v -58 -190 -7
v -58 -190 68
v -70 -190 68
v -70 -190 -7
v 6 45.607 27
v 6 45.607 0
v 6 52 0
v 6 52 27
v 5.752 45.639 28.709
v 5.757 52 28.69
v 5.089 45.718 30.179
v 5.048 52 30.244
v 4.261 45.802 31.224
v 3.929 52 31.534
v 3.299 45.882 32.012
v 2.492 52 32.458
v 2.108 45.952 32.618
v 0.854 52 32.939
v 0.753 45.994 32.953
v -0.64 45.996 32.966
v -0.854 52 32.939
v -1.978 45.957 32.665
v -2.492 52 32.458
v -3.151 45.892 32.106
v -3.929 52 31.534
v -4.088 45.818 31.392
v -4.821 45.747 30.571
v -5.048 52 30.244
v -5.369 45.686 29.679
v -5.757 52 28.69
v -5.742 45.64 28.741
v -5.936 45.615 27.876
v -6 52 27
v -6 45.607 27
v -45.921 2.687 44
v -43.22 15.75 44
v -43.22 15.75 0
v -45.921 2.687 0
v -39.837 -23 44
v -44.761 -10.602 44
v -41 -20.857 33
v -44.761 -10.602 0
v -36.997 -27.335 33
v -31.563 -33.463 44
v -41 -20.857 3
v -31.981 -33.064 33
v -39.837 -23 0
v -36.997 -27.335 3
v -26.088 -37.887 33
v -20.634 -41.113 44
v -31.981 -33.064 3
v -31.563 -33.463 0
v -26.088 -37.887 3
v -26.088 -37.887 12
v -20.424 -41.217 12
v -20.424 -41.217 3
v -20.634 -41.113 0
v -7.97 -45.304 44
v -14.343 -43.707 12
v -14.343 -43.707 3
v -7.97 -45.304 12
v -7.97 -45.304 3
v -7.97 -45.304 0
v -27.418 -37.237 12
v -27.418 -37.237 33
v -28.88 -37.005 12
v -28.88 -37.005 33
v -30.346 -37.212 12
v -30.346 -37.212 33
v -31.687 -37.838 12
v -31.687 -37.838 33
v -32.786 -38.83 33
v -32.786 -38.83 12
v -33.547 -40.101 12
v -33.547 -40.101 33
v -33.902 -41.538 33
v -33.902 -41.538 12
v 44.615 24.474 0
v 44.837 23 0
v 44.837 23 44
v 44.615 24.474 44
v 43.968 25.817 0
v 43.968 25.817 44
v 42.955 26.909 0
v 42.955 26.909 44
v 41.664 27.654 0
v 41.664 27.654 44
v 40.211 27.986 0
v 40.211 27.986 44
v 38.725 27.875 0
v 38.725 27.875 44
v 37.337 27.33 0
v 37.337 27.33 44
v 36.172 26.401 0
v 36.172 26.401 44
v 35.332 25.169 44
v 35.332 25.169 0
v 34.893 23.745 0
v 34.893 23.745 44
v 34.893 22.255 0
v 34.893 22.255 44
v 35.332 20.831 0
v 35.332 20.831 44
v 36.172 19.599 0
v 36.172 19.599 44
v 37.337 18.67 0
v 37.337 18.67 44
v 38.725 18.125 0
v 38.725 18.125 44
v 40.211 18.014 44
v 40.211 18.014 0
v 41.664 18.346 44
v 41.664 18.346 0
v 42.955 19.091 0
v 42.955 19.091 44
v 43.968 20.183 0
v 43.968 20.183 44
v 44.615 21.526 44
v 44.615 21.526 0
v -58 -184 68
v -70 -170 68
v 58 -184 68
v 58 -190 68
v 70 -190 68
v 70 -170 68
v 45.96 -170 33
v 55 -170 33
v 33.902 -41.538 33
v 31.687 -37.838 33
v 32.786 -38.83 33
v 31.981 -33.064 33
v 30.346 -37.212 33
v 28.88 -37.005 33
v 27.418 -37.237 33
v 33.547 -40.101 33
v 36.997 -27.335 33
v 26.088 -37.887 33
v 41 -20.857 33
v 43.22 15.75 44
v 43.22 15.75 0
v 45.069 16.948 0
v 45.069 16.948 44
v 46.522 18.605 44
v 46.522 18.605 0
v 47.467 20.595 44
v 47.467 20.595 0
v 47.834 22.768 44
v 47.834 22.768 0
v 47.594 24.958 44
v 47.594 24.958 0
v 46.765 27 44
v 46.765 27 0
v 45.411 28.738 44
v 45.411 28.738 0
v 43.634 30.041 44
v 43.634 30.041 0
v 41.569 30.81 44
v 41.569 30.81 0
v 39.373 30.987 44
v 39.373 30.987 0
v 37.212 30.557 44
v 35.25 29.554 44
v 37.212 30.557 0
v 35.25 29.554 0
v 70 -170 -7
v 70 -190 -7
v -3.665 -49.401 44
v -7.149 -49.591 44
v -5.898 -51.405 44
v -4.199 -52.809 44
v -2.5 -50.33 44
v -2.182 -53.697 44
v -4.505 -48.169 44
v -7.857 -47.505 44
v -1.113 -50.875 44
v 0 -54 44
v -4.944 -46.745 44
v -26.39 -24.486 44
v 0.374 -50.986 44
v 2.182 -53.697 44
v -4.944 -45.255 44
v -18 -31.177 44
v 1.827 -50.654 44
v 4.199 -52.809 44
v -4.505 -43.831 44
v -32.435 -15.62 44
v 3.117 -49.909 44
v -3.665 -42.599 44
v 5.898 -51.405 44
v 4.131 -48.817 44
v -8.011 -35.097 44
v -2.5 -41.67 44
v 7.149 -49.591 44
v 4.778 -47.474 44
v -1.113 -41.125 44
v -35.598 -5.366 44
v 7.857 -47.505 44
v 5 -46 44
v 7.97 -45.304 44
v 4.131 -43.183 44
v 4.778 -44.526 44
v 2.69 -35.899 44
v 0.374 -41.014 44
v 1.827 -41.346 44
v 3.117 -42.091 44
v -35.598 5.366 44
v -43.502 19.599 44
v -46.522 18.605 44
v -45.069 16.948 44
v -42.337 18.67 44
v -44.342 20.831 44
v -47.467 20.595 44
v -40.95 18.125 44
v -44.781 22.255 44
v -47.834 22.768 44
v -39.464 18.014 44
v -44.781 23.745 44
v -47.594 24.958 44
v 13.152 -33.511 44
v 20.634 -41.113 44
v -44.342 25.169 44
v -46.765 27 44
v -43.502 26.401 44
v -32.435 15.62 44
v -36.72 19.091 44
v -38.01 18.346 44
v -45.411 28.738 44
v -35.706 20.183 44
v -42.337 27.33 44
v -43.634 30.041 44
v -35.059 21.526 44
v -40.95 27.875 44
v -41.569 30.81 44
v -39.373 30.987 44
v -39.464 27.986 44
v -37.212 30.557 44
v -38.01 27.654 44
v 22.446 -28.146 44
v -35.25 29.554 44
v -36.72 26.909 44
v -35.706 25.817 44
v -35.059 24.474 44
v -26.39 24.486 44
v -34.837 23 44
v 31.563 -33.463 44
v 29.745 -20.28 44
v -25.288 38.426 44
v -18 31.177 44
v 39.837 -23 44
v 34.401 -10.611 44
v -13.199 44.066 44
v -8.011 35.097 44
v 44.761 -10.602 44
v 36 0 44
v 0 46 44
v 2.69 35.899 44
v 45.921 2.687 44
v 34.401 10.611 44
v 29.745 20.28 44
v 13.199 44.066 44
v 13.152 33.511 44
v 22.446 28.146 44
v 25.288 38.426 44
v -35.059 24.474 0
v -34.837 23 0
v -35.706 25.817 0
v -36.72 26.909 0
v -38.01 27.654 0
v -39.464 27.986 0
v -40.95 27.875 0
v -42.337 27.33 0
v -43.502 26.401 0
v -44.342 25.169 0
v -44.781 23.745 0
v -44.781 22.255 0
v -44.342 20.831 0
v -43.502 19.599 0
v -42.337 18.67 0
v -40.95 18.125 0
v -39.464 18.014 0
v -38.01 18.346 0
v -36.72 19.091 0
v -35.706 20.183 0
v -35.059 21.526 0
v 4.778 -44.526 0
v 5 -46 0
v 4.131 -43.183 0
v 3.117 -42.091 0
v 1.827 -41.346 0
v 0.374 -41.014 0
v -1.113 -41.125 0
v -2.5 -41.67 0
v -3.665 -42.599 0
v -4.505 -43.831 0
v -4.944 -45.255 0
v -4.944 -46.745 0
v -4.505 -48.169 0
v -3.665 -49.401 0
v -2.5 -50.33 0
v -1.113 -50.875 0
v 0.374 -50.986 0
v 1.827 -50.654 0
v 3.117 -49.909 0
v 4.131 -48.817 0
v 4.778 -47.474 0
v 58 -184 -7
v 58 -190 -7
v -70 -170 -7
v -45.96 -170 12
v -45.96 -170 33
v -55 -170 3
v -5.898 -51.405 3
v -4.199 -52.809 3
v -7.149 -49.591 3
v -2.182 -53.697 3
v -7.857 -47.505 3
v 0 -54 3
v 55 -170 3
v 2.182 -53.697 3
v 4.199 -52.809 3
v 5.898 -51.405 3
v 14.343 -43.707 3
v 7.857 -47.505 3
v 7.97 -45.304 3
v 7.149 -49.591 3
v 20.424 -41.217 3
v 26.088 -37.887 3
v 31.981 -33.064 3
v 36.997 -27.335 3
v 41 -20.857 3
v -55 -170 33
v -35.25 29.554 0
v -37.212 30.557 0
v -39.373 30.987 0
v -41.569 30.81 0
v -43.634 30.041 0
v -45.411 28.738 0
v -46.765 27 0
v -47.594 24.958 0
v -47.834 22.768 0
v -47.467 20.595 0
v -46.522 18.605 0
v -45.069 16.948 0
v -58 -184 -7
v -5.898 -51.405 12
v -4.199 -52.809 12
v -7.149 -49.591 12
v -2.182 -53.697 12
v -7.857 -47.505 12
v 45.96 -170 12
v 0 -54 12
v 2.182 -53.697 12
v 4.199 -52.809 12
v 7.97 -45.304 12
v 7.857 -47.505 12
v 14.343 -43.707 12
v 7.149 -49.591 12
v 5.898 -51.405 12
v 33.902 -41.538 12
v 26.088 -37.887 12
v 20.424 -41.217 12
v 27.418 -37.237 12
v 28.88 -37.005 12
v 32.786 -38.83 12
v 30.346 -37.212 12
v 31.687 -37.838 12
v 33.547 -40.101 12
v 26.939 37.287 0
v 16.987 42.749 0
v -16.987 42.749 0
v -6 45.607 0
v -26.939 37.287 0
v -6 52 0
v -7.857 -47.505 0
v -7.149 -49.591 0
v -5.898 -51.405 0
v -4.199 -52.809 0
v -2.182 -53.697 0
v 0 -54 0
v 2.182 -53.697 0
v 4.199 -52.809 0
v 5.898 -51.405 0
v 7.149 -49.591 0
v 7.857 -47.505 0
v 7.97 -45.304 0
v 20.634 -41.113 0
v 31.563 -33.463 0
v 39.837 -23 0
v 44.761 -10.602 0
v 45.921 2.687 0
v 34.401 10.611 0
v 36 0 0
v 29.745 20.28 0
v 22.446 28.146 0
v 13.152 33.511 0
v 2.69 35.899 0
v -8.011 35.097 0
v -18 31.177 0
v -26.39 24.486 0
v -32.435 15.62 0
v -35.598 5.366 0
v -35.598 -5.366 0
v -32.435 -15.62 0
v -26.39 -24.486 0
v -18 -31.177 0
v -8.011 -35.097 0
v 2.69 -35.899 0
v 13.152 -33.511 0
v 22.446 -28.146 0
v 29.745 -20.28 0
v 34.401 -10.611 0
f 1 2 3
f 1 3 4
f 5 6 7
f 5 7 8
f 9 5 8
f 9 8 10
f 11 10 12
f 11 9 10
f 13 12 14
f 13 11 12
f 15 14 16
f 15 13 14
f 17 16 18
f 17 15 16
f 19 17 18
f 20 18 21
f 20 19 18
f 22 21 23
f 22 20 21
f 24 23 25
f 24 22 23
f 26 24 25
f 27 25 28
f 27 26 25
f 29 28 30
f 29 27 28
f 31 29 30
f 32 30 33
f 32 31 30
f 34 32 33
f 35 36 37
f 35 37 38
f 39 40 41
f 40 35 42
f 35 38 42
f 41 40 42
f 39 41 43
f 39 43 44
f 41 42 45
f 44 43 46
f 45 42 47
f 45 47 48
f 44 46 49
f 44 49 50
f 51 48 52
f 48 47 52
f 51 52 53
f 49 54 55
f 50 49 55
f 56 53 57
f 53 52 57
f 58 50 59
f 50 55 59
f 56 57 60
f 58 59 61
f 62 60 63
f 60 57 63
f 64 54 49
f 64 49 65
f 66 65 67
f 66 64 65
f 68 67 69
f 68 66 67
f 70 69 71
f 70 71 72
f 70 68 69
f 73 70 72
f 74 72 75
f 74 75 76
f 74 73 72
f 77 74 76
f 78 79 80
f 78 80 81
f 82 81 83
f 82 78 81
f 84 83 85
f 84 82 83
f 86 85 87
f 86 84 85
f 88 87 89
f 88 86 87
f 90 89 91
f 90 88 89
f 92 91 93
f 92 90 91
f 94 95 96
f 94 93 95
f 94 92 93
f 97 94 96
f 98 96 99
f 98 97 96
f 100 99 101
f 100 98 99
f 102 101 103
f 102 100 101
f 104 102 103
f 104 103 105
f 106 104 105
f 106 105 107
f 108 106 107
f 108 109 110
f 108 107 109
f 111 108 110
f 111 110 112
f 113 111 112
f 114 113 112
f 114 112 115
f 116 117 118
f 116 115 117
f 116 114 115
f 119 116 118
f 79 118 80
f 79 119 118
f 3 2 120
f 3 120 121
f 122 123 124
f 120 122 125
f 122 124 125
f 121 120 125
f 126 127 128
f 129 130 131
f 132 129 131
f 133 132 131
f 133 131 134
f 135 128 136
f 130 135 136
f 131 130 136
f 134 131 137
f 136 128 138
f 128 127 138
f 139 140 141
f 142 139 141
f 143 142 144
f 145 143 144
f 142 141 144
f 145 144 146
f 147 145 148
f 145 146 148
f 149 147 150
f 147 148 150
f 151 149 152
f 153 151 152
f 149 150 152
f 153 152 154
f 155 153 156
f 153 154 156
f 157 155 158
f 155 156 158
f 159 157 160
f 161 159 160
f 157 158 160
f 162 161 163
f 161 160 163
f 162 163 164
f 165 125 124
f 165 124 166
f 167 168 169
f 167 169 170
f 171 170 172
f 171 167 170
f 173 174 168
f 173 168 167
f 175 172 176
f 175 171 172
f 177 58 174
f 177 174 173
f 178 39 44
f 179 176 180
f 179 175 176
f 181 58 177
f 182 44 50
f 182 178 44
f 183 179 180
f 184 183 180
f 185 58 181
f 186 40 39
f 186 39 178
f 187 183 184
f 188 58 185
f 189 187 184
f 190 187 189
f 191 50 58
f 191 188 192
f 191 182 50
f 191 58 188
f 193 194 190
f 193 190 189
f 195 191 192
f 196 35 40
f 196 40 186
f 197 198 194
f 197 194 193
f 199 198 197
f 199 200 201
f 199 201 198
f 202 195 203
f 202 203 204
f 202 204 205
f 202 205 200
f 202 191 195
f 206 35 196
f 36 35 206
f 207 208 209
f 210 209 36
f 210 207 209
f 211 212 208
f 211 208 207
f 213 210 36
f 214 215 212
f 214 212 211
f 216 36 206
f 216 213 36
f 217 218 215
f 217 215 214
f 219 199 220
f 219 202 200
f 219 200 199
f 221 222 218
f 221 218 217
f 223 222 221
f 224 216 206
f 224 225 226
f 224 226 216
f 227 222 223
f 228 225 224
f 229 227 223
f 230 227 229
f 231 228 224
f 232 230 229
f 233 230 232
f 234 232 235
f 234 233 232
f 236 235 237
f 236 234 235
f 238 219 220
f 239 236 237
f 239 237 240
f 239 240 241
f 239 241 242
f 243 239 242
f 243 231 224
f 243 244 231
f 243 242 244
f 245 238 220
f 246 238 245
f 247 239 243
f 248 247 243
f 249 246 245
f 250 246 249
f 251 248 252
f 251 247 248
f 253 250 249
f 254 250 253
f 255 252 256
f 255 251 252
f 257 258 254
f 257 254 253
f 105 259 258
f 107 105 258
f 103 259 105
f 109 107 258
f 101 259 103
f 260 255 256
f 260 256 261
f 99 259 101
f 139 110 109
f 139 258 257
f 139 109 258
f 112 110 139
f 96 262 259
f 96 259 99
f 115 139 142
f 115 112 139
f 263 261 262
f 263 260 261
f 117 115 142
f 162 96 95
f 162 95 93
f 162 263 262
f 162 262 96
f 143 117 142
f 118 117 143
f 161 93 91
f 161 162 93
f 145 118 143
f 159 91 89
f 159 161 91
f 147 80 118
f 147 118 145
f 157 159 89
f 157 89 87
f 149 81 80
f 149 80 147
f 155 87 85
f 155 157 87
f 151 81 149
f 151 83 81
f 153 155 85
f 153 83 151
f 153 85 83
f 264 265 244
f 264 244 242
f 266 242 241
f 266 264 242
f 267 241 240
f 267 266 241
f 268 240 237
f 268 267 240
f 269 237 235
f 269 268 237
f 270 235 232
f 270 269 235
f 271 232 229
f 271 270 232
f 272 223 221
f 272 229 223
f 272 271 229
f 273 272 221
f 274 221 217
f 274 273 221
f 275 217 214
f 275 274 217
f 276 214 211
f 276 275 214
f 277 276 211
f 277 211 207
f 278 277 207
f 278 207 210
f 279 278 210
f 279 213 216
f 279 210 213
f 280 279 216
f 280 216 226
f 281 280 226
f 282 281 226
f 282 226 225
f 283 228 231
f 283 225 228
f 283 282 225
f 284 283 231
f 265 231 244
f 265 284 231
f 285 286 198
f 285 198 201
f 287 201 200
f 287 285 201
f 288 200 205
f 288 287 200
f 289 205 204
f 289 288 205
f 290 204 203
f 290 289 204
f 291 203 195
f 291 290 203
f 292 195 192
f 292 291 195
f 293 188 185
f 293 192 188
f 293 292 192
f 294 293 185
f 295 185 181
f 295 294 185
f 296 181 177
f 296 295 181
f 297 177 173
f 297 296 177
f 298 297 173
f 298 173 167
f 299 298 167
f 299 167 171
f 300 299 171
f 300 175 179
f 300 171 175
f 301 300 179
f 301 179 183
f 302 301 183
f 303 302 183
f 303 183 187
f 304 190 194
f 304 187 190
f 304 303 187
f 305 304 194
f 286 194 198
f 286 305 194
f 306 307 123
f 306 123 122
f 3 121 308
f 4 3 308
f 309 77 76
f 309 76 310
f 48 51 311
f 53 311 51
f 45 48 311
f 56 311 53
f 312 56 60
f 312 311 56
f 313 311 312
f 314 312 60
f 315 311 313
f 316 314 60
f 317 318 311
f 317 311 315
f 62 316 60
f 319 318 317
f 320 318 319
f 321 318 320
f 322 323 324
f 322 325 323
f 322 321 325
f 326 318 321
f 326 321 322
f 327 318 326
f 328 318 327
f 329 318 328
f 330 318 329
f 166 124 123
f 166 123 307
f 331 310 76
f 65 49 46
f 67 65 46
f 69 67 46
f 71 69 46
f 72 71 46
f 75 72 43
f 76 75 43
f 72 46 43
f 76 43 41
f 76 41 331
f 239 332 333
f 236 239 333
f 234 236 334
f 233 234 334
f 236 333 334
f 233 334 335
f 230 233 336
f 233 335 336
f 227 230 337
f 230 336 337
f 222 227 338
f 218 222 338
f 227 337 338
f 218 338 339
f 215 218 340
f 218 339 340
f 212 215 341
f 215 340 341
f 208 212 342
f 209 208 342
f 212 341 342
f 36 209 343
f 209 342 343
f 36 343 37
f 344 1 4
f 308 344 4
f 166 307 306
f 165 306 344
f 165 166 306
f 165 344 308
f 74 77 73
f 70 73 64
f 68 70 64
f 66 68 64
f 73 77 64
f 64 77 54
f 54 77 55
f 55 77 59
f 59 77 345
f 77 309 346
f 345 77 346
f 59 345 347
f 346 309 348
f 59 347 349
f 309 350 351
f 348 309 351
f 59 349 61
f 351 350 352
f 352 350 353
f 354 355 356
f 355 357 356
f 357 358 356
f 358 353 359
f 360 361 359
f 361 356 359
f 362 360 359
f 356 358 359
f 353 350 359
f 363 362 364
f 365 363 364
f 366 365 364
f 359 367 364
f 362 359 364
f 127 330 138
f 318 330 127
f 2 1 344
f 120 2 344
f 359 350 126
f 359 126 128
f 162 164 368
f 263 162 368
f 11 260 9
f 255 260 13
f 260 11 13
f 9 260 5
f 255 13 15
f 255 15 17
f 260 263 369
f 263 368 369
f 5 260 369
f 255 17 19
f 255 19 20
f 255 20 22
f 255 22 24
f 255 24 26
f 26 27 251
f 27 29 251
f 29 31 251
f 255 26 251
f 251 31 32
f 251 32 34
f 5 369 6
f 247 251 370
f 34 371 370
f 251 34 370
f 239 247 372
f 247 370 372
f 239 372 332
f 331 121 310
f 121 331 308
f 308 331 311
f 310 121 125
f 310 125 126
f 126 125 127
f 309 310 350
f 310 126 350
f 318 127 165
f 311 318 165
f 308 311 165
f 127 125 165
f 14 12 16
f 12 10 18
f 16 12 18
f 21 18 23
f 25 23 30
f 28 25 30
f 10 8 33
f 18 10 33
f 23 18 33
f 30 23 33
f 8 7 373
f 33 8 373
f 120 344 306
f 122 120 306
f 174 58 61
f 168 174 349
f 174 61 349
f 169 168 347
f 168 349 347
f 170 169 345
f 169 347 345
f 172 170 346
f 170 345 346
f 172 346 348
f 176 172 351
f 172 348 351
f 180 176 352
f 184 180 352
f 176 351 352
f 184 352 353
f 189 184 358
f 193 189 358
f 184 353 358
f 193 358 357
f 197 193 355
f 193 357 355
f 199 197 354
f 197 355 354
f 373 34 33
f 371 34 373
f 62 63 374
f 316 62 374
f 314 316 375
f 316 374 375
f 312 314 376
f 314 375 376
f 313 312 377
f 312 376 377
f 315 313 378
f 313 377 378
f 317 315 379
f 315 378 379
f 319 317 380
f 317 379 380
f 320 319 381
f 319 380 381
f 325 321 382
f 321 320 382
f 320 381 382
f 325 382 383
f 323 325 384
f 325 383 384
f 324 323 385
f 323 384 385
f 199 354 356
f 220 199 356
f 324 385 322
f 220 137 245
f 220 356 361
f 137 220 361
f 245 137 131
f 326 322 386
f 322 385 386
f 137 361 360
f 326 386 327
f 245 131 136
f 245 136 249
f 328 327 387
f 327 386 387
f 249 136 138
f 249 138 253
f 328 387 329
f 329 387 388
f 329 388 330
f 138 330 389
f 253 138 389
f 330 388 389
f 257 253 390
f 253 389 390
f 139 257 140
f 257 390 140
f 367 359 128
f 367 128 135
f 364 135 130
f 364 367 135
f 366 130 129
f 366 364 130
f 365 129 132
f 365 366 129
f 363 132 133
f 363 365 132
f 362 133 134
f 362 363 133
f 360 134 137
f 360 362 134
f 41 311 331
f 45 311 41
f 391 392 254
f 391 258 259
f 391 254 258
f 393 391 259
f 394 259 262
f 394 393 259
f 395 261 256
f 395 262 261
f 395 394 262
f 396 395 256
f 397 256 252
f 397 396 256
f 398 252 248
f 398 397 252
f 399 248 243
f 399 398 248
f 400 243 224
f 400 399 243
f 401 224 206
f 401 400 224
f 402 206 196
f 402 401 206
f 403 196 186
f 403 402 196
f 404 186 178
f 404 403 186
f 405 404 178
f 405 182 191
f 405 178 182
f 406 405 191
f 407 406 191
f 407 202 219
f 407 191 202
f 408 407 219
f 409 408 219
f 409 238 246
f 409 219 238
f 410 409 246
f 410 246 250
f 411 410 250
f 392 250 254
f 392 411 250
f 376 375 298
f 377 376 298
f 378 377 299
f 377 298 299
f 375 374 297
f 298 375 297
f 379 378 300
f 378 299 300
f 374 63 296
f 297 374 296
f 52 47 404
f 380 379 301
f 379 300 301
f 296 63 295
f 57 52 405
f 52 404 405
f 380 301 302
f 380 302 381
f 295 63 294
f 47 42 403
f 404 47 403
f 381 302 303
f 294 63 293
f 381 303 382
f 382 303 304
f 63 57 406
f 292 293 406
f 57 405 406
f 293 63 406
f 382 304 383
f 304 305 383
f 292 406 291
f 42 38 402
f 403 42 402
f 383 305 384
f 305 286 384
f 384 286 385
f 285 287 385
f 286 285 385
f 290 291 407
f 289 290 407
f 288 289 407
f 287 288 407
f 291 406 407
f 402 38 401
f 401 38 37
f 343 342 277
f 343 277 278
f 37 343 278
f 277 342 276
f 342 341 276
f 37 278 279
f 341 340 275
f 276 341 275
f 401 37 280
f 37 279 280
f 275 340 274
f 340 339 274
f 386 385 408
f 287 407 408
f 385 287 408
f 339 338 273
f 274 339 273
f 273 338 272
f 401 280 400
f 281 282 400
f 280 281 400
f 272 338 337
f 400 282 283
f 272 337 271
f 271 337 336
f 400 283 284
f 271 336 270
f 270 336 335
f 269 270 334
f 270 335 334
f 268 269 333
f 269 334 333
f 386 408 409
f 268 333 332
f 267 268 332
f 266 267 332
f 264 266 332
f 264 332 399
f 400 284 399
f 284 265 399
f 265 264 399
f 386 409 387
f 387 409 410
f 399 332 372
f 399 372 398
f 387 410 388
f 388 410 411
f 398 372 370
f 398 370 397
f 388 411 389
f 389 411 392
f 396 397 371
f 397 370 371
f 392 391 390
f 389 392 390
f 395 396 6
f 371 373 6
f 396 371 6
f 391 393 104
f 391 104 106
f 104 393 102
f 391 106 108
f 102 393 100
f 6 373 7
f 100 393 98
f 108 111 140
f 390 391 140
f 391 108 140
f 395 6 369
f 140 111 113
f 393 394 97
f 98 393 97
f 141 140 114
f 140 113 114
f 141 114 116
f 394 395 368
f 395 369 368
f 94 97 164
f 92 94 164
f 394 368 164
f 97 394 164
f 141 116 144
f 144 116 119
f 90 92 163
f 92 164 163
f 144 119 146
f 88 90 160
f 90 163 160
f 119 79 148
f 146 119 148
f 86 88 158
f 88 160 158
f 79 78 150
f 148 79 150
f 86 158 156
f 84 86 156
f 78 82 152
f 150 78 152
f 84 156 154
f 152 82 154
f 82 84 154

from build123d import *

# Parameters (mm, degrees)
EXTRUDE_1_DEPTH             = 44
SKETCH_2_W                  = 75
SKETCH_2_H                  = 20
EXTRUDE_2_DEPTH             = 70
EXTRUDE_3_DEPTH             = 30
EXTRUDE_4_REACH             = 215.598
SKETCH_4_W                  = 9
SKETCH_4_H                  = 170
EXTRUDE_4_DIRECTION_2_REACH = 215.598
EXTRUDE_5_DEPTH             = 52
CUT_EXTRUDE_1_DEPTH         = 214.597752797
CUT_EXTRUDE_1_DEPTH_BACK    = 214.597752797
SKETCH_6_R                  = 36
SKETCH_6_R_2                = 5
SKETCH_6_W                  = 116
SKETCH_6_H                  = 6


with BuildPart() as part:
    # 草图1 → 凸台-拉伸1 (new body)
    with BuildSketch(Plane.XY):
        with BuildLine():
            ThreePointArc((7.969696861, -45.304347826), (39.837168574, -23), (43.21956455, 15.750213971))
            ThreePointArc((43.21956455, 15.750213971), (46.765371804, 27), (35.249867689, 29.554133855))
            ThreePointArc((35.249867689, 29.554133855), (0, 46), (-35.249867689, 29.554133855))
            ThreePointArc((-35.249867689, 29.554133855), (-46.765371804, 27), (-43.21956455, 15.750213971))
            ThreePointArc((-43.21956455, 15.750213971), (-39.837168574, -23), (-7.969696861, -45.304347826))
            ThreePointArc((-7.969696861, -45.304347826), (0, -54), (7.969696861, -45.304347826))
        make_face()
    extrude(amount=EXTRUDE_1_DEPTH)



with BuildPart() as body_2:
    # 草图2 → 凸台-拉伸2 (new, symmetric)
    with BuildSketch(Plane(origin=(0, 0, 0), x_dir=(0, 0, -1), z_dir=(1, 0, 0))):
        with Locations((-30.5, -180)):
            Rectangle(SKETCH_2_W, SKETCH_2_H)
    extrude(amount=EXTRUDE_2_DEPTH, both=True)


with BuildPart() as part_1:
    add(part.part)

    add(body_2.part)  # 凸台-拉伸3 merges body 2
    # 草图3 → 凸台-拉伸3 (add)
    with BuildSketch(Plane.XY.offset(3)):
        with BuildLine():
            Line((55, -170), (45.960435355, -170))
            Line((45.960435355, -170), (33.901757224, -41.537742182))
            ThreePointArc((33.901757224, -41.537742182), (31.040174213, -37.475102515), (26.087990263, -37.886894358))
            ThreePointArc((26.087990263, -37.886894358), (34.60790205, -30.303351559), (41, -20.856653615))
            Line((41, -20.856653615), (55, -170))
        make_face()
        with BuildLine():
            Line((-33.901757224, -41.537742182), (-45.960435355, -170))
            Line((-45.960435355, -170), (-55, -170))
            Line((-55, -170), (-41, -20.856653615))
            ThreePointArc((-41, -20.856653615), (-34.60790205, -30.303351559), (-26.087990263, -37.886894358))
            ThreePointArc((-26.087990263, -37.886894358), (-31.040174213, -37.475102515), (-33.901757224, -41.537742182))
        make_face()
    extrude(amount=EXTRUDE_3_DEPTH)

    # 草图4 → 凸台-拉伸4 (add, up to next)
    with BuildSketch(Plane(origin=(0, 0, 0), x_dir=(0, 0, -1), z_dir=(1, 0, 0)), mode=Mode.PRIVATE) as extrude_4_sk1:
        with Locations((-7.5, -85)):
            Rectangle(SKETCH_4_W, SKETCH_4_H)
    extrude_4_tool1 = extrude(extrude_4_sk1.sketch, amount=EXTRUDE_4_REACH, mode=Mode.PRIVATE) - part_1.part
    add(extrude_4_tool1.solids().sort_by_distance((0, -85, 7.5))[0])

    # 草图4 → 凸台-拉伸4 direction 2 (add, up to next)
    with BuildSketch(Plane(origin=(0, 0, 0), x_dir=(0, 0, -1), z_dir=(1, 0, 0)), mode=Mode.PRIVATE) as extrude_4_direction_2_sk1:
        with Locations((-7.5, -85)):
            Rectangle(SKETCH_4_W, SKETCH_4_H)
    extrude_4_direction_2_tool1 = extrude(extrude_4_direction_2_sk1.sketch, amount=-EXTRUDE_4_DIRECTION_2_REACH, mode=Mode.PRIVATE) - part_1.part
    add(extrude_4_direction_2_tool1.solids().sort_by_distance((0, -85, 7.5))[0])

    # 草图5 → 凸台-拉伸5 (add)
    with BuildSketch(Plane(origin=(0, 0, 0), x_dir=(1, 0, 0), z_dir=(0, 1, 0))):
        with BuildLine():
            Line((-6, -27), (-6, 0))
            Line((-6, 0), (6, 0))
            Line((6, 0), (6, -27))
            ThreePointArc((6, -27), (0, -33), (-6, -27))
        make_face()
    extrude(amount=EXTRUDE_5_DEPTH)

    # 草图6 → 切除-拉伸1 (cut, two sides: drawn at the far end of the back side and taken through both)
    with BuildSketch(Plane.XY.offset(-CUT_EXTRUDE_1_DEPTH_BACK)):
        Circle(SKETCH_6_R)
        with Locations((0, -46)):
            Circle(SKETCH_6_R_2)
        with Locations((-39.837168574, 23)):
            Circle(SKETCH_6_R_2)
        with Locations((39.837168574, 23)):
            Circle(SKETCH_6_R_2)
        with Locations((0, -187)):
            Rectangle(SKETCH_6_W, SKETCH_6_H)
    extrude(amount=CUT_EXTRUDE_1_DEPTH + CUT_EXTRUDE_1_DEPTH_BACK, mode=Mode.SUBTRACT)


solid = part_1.part
